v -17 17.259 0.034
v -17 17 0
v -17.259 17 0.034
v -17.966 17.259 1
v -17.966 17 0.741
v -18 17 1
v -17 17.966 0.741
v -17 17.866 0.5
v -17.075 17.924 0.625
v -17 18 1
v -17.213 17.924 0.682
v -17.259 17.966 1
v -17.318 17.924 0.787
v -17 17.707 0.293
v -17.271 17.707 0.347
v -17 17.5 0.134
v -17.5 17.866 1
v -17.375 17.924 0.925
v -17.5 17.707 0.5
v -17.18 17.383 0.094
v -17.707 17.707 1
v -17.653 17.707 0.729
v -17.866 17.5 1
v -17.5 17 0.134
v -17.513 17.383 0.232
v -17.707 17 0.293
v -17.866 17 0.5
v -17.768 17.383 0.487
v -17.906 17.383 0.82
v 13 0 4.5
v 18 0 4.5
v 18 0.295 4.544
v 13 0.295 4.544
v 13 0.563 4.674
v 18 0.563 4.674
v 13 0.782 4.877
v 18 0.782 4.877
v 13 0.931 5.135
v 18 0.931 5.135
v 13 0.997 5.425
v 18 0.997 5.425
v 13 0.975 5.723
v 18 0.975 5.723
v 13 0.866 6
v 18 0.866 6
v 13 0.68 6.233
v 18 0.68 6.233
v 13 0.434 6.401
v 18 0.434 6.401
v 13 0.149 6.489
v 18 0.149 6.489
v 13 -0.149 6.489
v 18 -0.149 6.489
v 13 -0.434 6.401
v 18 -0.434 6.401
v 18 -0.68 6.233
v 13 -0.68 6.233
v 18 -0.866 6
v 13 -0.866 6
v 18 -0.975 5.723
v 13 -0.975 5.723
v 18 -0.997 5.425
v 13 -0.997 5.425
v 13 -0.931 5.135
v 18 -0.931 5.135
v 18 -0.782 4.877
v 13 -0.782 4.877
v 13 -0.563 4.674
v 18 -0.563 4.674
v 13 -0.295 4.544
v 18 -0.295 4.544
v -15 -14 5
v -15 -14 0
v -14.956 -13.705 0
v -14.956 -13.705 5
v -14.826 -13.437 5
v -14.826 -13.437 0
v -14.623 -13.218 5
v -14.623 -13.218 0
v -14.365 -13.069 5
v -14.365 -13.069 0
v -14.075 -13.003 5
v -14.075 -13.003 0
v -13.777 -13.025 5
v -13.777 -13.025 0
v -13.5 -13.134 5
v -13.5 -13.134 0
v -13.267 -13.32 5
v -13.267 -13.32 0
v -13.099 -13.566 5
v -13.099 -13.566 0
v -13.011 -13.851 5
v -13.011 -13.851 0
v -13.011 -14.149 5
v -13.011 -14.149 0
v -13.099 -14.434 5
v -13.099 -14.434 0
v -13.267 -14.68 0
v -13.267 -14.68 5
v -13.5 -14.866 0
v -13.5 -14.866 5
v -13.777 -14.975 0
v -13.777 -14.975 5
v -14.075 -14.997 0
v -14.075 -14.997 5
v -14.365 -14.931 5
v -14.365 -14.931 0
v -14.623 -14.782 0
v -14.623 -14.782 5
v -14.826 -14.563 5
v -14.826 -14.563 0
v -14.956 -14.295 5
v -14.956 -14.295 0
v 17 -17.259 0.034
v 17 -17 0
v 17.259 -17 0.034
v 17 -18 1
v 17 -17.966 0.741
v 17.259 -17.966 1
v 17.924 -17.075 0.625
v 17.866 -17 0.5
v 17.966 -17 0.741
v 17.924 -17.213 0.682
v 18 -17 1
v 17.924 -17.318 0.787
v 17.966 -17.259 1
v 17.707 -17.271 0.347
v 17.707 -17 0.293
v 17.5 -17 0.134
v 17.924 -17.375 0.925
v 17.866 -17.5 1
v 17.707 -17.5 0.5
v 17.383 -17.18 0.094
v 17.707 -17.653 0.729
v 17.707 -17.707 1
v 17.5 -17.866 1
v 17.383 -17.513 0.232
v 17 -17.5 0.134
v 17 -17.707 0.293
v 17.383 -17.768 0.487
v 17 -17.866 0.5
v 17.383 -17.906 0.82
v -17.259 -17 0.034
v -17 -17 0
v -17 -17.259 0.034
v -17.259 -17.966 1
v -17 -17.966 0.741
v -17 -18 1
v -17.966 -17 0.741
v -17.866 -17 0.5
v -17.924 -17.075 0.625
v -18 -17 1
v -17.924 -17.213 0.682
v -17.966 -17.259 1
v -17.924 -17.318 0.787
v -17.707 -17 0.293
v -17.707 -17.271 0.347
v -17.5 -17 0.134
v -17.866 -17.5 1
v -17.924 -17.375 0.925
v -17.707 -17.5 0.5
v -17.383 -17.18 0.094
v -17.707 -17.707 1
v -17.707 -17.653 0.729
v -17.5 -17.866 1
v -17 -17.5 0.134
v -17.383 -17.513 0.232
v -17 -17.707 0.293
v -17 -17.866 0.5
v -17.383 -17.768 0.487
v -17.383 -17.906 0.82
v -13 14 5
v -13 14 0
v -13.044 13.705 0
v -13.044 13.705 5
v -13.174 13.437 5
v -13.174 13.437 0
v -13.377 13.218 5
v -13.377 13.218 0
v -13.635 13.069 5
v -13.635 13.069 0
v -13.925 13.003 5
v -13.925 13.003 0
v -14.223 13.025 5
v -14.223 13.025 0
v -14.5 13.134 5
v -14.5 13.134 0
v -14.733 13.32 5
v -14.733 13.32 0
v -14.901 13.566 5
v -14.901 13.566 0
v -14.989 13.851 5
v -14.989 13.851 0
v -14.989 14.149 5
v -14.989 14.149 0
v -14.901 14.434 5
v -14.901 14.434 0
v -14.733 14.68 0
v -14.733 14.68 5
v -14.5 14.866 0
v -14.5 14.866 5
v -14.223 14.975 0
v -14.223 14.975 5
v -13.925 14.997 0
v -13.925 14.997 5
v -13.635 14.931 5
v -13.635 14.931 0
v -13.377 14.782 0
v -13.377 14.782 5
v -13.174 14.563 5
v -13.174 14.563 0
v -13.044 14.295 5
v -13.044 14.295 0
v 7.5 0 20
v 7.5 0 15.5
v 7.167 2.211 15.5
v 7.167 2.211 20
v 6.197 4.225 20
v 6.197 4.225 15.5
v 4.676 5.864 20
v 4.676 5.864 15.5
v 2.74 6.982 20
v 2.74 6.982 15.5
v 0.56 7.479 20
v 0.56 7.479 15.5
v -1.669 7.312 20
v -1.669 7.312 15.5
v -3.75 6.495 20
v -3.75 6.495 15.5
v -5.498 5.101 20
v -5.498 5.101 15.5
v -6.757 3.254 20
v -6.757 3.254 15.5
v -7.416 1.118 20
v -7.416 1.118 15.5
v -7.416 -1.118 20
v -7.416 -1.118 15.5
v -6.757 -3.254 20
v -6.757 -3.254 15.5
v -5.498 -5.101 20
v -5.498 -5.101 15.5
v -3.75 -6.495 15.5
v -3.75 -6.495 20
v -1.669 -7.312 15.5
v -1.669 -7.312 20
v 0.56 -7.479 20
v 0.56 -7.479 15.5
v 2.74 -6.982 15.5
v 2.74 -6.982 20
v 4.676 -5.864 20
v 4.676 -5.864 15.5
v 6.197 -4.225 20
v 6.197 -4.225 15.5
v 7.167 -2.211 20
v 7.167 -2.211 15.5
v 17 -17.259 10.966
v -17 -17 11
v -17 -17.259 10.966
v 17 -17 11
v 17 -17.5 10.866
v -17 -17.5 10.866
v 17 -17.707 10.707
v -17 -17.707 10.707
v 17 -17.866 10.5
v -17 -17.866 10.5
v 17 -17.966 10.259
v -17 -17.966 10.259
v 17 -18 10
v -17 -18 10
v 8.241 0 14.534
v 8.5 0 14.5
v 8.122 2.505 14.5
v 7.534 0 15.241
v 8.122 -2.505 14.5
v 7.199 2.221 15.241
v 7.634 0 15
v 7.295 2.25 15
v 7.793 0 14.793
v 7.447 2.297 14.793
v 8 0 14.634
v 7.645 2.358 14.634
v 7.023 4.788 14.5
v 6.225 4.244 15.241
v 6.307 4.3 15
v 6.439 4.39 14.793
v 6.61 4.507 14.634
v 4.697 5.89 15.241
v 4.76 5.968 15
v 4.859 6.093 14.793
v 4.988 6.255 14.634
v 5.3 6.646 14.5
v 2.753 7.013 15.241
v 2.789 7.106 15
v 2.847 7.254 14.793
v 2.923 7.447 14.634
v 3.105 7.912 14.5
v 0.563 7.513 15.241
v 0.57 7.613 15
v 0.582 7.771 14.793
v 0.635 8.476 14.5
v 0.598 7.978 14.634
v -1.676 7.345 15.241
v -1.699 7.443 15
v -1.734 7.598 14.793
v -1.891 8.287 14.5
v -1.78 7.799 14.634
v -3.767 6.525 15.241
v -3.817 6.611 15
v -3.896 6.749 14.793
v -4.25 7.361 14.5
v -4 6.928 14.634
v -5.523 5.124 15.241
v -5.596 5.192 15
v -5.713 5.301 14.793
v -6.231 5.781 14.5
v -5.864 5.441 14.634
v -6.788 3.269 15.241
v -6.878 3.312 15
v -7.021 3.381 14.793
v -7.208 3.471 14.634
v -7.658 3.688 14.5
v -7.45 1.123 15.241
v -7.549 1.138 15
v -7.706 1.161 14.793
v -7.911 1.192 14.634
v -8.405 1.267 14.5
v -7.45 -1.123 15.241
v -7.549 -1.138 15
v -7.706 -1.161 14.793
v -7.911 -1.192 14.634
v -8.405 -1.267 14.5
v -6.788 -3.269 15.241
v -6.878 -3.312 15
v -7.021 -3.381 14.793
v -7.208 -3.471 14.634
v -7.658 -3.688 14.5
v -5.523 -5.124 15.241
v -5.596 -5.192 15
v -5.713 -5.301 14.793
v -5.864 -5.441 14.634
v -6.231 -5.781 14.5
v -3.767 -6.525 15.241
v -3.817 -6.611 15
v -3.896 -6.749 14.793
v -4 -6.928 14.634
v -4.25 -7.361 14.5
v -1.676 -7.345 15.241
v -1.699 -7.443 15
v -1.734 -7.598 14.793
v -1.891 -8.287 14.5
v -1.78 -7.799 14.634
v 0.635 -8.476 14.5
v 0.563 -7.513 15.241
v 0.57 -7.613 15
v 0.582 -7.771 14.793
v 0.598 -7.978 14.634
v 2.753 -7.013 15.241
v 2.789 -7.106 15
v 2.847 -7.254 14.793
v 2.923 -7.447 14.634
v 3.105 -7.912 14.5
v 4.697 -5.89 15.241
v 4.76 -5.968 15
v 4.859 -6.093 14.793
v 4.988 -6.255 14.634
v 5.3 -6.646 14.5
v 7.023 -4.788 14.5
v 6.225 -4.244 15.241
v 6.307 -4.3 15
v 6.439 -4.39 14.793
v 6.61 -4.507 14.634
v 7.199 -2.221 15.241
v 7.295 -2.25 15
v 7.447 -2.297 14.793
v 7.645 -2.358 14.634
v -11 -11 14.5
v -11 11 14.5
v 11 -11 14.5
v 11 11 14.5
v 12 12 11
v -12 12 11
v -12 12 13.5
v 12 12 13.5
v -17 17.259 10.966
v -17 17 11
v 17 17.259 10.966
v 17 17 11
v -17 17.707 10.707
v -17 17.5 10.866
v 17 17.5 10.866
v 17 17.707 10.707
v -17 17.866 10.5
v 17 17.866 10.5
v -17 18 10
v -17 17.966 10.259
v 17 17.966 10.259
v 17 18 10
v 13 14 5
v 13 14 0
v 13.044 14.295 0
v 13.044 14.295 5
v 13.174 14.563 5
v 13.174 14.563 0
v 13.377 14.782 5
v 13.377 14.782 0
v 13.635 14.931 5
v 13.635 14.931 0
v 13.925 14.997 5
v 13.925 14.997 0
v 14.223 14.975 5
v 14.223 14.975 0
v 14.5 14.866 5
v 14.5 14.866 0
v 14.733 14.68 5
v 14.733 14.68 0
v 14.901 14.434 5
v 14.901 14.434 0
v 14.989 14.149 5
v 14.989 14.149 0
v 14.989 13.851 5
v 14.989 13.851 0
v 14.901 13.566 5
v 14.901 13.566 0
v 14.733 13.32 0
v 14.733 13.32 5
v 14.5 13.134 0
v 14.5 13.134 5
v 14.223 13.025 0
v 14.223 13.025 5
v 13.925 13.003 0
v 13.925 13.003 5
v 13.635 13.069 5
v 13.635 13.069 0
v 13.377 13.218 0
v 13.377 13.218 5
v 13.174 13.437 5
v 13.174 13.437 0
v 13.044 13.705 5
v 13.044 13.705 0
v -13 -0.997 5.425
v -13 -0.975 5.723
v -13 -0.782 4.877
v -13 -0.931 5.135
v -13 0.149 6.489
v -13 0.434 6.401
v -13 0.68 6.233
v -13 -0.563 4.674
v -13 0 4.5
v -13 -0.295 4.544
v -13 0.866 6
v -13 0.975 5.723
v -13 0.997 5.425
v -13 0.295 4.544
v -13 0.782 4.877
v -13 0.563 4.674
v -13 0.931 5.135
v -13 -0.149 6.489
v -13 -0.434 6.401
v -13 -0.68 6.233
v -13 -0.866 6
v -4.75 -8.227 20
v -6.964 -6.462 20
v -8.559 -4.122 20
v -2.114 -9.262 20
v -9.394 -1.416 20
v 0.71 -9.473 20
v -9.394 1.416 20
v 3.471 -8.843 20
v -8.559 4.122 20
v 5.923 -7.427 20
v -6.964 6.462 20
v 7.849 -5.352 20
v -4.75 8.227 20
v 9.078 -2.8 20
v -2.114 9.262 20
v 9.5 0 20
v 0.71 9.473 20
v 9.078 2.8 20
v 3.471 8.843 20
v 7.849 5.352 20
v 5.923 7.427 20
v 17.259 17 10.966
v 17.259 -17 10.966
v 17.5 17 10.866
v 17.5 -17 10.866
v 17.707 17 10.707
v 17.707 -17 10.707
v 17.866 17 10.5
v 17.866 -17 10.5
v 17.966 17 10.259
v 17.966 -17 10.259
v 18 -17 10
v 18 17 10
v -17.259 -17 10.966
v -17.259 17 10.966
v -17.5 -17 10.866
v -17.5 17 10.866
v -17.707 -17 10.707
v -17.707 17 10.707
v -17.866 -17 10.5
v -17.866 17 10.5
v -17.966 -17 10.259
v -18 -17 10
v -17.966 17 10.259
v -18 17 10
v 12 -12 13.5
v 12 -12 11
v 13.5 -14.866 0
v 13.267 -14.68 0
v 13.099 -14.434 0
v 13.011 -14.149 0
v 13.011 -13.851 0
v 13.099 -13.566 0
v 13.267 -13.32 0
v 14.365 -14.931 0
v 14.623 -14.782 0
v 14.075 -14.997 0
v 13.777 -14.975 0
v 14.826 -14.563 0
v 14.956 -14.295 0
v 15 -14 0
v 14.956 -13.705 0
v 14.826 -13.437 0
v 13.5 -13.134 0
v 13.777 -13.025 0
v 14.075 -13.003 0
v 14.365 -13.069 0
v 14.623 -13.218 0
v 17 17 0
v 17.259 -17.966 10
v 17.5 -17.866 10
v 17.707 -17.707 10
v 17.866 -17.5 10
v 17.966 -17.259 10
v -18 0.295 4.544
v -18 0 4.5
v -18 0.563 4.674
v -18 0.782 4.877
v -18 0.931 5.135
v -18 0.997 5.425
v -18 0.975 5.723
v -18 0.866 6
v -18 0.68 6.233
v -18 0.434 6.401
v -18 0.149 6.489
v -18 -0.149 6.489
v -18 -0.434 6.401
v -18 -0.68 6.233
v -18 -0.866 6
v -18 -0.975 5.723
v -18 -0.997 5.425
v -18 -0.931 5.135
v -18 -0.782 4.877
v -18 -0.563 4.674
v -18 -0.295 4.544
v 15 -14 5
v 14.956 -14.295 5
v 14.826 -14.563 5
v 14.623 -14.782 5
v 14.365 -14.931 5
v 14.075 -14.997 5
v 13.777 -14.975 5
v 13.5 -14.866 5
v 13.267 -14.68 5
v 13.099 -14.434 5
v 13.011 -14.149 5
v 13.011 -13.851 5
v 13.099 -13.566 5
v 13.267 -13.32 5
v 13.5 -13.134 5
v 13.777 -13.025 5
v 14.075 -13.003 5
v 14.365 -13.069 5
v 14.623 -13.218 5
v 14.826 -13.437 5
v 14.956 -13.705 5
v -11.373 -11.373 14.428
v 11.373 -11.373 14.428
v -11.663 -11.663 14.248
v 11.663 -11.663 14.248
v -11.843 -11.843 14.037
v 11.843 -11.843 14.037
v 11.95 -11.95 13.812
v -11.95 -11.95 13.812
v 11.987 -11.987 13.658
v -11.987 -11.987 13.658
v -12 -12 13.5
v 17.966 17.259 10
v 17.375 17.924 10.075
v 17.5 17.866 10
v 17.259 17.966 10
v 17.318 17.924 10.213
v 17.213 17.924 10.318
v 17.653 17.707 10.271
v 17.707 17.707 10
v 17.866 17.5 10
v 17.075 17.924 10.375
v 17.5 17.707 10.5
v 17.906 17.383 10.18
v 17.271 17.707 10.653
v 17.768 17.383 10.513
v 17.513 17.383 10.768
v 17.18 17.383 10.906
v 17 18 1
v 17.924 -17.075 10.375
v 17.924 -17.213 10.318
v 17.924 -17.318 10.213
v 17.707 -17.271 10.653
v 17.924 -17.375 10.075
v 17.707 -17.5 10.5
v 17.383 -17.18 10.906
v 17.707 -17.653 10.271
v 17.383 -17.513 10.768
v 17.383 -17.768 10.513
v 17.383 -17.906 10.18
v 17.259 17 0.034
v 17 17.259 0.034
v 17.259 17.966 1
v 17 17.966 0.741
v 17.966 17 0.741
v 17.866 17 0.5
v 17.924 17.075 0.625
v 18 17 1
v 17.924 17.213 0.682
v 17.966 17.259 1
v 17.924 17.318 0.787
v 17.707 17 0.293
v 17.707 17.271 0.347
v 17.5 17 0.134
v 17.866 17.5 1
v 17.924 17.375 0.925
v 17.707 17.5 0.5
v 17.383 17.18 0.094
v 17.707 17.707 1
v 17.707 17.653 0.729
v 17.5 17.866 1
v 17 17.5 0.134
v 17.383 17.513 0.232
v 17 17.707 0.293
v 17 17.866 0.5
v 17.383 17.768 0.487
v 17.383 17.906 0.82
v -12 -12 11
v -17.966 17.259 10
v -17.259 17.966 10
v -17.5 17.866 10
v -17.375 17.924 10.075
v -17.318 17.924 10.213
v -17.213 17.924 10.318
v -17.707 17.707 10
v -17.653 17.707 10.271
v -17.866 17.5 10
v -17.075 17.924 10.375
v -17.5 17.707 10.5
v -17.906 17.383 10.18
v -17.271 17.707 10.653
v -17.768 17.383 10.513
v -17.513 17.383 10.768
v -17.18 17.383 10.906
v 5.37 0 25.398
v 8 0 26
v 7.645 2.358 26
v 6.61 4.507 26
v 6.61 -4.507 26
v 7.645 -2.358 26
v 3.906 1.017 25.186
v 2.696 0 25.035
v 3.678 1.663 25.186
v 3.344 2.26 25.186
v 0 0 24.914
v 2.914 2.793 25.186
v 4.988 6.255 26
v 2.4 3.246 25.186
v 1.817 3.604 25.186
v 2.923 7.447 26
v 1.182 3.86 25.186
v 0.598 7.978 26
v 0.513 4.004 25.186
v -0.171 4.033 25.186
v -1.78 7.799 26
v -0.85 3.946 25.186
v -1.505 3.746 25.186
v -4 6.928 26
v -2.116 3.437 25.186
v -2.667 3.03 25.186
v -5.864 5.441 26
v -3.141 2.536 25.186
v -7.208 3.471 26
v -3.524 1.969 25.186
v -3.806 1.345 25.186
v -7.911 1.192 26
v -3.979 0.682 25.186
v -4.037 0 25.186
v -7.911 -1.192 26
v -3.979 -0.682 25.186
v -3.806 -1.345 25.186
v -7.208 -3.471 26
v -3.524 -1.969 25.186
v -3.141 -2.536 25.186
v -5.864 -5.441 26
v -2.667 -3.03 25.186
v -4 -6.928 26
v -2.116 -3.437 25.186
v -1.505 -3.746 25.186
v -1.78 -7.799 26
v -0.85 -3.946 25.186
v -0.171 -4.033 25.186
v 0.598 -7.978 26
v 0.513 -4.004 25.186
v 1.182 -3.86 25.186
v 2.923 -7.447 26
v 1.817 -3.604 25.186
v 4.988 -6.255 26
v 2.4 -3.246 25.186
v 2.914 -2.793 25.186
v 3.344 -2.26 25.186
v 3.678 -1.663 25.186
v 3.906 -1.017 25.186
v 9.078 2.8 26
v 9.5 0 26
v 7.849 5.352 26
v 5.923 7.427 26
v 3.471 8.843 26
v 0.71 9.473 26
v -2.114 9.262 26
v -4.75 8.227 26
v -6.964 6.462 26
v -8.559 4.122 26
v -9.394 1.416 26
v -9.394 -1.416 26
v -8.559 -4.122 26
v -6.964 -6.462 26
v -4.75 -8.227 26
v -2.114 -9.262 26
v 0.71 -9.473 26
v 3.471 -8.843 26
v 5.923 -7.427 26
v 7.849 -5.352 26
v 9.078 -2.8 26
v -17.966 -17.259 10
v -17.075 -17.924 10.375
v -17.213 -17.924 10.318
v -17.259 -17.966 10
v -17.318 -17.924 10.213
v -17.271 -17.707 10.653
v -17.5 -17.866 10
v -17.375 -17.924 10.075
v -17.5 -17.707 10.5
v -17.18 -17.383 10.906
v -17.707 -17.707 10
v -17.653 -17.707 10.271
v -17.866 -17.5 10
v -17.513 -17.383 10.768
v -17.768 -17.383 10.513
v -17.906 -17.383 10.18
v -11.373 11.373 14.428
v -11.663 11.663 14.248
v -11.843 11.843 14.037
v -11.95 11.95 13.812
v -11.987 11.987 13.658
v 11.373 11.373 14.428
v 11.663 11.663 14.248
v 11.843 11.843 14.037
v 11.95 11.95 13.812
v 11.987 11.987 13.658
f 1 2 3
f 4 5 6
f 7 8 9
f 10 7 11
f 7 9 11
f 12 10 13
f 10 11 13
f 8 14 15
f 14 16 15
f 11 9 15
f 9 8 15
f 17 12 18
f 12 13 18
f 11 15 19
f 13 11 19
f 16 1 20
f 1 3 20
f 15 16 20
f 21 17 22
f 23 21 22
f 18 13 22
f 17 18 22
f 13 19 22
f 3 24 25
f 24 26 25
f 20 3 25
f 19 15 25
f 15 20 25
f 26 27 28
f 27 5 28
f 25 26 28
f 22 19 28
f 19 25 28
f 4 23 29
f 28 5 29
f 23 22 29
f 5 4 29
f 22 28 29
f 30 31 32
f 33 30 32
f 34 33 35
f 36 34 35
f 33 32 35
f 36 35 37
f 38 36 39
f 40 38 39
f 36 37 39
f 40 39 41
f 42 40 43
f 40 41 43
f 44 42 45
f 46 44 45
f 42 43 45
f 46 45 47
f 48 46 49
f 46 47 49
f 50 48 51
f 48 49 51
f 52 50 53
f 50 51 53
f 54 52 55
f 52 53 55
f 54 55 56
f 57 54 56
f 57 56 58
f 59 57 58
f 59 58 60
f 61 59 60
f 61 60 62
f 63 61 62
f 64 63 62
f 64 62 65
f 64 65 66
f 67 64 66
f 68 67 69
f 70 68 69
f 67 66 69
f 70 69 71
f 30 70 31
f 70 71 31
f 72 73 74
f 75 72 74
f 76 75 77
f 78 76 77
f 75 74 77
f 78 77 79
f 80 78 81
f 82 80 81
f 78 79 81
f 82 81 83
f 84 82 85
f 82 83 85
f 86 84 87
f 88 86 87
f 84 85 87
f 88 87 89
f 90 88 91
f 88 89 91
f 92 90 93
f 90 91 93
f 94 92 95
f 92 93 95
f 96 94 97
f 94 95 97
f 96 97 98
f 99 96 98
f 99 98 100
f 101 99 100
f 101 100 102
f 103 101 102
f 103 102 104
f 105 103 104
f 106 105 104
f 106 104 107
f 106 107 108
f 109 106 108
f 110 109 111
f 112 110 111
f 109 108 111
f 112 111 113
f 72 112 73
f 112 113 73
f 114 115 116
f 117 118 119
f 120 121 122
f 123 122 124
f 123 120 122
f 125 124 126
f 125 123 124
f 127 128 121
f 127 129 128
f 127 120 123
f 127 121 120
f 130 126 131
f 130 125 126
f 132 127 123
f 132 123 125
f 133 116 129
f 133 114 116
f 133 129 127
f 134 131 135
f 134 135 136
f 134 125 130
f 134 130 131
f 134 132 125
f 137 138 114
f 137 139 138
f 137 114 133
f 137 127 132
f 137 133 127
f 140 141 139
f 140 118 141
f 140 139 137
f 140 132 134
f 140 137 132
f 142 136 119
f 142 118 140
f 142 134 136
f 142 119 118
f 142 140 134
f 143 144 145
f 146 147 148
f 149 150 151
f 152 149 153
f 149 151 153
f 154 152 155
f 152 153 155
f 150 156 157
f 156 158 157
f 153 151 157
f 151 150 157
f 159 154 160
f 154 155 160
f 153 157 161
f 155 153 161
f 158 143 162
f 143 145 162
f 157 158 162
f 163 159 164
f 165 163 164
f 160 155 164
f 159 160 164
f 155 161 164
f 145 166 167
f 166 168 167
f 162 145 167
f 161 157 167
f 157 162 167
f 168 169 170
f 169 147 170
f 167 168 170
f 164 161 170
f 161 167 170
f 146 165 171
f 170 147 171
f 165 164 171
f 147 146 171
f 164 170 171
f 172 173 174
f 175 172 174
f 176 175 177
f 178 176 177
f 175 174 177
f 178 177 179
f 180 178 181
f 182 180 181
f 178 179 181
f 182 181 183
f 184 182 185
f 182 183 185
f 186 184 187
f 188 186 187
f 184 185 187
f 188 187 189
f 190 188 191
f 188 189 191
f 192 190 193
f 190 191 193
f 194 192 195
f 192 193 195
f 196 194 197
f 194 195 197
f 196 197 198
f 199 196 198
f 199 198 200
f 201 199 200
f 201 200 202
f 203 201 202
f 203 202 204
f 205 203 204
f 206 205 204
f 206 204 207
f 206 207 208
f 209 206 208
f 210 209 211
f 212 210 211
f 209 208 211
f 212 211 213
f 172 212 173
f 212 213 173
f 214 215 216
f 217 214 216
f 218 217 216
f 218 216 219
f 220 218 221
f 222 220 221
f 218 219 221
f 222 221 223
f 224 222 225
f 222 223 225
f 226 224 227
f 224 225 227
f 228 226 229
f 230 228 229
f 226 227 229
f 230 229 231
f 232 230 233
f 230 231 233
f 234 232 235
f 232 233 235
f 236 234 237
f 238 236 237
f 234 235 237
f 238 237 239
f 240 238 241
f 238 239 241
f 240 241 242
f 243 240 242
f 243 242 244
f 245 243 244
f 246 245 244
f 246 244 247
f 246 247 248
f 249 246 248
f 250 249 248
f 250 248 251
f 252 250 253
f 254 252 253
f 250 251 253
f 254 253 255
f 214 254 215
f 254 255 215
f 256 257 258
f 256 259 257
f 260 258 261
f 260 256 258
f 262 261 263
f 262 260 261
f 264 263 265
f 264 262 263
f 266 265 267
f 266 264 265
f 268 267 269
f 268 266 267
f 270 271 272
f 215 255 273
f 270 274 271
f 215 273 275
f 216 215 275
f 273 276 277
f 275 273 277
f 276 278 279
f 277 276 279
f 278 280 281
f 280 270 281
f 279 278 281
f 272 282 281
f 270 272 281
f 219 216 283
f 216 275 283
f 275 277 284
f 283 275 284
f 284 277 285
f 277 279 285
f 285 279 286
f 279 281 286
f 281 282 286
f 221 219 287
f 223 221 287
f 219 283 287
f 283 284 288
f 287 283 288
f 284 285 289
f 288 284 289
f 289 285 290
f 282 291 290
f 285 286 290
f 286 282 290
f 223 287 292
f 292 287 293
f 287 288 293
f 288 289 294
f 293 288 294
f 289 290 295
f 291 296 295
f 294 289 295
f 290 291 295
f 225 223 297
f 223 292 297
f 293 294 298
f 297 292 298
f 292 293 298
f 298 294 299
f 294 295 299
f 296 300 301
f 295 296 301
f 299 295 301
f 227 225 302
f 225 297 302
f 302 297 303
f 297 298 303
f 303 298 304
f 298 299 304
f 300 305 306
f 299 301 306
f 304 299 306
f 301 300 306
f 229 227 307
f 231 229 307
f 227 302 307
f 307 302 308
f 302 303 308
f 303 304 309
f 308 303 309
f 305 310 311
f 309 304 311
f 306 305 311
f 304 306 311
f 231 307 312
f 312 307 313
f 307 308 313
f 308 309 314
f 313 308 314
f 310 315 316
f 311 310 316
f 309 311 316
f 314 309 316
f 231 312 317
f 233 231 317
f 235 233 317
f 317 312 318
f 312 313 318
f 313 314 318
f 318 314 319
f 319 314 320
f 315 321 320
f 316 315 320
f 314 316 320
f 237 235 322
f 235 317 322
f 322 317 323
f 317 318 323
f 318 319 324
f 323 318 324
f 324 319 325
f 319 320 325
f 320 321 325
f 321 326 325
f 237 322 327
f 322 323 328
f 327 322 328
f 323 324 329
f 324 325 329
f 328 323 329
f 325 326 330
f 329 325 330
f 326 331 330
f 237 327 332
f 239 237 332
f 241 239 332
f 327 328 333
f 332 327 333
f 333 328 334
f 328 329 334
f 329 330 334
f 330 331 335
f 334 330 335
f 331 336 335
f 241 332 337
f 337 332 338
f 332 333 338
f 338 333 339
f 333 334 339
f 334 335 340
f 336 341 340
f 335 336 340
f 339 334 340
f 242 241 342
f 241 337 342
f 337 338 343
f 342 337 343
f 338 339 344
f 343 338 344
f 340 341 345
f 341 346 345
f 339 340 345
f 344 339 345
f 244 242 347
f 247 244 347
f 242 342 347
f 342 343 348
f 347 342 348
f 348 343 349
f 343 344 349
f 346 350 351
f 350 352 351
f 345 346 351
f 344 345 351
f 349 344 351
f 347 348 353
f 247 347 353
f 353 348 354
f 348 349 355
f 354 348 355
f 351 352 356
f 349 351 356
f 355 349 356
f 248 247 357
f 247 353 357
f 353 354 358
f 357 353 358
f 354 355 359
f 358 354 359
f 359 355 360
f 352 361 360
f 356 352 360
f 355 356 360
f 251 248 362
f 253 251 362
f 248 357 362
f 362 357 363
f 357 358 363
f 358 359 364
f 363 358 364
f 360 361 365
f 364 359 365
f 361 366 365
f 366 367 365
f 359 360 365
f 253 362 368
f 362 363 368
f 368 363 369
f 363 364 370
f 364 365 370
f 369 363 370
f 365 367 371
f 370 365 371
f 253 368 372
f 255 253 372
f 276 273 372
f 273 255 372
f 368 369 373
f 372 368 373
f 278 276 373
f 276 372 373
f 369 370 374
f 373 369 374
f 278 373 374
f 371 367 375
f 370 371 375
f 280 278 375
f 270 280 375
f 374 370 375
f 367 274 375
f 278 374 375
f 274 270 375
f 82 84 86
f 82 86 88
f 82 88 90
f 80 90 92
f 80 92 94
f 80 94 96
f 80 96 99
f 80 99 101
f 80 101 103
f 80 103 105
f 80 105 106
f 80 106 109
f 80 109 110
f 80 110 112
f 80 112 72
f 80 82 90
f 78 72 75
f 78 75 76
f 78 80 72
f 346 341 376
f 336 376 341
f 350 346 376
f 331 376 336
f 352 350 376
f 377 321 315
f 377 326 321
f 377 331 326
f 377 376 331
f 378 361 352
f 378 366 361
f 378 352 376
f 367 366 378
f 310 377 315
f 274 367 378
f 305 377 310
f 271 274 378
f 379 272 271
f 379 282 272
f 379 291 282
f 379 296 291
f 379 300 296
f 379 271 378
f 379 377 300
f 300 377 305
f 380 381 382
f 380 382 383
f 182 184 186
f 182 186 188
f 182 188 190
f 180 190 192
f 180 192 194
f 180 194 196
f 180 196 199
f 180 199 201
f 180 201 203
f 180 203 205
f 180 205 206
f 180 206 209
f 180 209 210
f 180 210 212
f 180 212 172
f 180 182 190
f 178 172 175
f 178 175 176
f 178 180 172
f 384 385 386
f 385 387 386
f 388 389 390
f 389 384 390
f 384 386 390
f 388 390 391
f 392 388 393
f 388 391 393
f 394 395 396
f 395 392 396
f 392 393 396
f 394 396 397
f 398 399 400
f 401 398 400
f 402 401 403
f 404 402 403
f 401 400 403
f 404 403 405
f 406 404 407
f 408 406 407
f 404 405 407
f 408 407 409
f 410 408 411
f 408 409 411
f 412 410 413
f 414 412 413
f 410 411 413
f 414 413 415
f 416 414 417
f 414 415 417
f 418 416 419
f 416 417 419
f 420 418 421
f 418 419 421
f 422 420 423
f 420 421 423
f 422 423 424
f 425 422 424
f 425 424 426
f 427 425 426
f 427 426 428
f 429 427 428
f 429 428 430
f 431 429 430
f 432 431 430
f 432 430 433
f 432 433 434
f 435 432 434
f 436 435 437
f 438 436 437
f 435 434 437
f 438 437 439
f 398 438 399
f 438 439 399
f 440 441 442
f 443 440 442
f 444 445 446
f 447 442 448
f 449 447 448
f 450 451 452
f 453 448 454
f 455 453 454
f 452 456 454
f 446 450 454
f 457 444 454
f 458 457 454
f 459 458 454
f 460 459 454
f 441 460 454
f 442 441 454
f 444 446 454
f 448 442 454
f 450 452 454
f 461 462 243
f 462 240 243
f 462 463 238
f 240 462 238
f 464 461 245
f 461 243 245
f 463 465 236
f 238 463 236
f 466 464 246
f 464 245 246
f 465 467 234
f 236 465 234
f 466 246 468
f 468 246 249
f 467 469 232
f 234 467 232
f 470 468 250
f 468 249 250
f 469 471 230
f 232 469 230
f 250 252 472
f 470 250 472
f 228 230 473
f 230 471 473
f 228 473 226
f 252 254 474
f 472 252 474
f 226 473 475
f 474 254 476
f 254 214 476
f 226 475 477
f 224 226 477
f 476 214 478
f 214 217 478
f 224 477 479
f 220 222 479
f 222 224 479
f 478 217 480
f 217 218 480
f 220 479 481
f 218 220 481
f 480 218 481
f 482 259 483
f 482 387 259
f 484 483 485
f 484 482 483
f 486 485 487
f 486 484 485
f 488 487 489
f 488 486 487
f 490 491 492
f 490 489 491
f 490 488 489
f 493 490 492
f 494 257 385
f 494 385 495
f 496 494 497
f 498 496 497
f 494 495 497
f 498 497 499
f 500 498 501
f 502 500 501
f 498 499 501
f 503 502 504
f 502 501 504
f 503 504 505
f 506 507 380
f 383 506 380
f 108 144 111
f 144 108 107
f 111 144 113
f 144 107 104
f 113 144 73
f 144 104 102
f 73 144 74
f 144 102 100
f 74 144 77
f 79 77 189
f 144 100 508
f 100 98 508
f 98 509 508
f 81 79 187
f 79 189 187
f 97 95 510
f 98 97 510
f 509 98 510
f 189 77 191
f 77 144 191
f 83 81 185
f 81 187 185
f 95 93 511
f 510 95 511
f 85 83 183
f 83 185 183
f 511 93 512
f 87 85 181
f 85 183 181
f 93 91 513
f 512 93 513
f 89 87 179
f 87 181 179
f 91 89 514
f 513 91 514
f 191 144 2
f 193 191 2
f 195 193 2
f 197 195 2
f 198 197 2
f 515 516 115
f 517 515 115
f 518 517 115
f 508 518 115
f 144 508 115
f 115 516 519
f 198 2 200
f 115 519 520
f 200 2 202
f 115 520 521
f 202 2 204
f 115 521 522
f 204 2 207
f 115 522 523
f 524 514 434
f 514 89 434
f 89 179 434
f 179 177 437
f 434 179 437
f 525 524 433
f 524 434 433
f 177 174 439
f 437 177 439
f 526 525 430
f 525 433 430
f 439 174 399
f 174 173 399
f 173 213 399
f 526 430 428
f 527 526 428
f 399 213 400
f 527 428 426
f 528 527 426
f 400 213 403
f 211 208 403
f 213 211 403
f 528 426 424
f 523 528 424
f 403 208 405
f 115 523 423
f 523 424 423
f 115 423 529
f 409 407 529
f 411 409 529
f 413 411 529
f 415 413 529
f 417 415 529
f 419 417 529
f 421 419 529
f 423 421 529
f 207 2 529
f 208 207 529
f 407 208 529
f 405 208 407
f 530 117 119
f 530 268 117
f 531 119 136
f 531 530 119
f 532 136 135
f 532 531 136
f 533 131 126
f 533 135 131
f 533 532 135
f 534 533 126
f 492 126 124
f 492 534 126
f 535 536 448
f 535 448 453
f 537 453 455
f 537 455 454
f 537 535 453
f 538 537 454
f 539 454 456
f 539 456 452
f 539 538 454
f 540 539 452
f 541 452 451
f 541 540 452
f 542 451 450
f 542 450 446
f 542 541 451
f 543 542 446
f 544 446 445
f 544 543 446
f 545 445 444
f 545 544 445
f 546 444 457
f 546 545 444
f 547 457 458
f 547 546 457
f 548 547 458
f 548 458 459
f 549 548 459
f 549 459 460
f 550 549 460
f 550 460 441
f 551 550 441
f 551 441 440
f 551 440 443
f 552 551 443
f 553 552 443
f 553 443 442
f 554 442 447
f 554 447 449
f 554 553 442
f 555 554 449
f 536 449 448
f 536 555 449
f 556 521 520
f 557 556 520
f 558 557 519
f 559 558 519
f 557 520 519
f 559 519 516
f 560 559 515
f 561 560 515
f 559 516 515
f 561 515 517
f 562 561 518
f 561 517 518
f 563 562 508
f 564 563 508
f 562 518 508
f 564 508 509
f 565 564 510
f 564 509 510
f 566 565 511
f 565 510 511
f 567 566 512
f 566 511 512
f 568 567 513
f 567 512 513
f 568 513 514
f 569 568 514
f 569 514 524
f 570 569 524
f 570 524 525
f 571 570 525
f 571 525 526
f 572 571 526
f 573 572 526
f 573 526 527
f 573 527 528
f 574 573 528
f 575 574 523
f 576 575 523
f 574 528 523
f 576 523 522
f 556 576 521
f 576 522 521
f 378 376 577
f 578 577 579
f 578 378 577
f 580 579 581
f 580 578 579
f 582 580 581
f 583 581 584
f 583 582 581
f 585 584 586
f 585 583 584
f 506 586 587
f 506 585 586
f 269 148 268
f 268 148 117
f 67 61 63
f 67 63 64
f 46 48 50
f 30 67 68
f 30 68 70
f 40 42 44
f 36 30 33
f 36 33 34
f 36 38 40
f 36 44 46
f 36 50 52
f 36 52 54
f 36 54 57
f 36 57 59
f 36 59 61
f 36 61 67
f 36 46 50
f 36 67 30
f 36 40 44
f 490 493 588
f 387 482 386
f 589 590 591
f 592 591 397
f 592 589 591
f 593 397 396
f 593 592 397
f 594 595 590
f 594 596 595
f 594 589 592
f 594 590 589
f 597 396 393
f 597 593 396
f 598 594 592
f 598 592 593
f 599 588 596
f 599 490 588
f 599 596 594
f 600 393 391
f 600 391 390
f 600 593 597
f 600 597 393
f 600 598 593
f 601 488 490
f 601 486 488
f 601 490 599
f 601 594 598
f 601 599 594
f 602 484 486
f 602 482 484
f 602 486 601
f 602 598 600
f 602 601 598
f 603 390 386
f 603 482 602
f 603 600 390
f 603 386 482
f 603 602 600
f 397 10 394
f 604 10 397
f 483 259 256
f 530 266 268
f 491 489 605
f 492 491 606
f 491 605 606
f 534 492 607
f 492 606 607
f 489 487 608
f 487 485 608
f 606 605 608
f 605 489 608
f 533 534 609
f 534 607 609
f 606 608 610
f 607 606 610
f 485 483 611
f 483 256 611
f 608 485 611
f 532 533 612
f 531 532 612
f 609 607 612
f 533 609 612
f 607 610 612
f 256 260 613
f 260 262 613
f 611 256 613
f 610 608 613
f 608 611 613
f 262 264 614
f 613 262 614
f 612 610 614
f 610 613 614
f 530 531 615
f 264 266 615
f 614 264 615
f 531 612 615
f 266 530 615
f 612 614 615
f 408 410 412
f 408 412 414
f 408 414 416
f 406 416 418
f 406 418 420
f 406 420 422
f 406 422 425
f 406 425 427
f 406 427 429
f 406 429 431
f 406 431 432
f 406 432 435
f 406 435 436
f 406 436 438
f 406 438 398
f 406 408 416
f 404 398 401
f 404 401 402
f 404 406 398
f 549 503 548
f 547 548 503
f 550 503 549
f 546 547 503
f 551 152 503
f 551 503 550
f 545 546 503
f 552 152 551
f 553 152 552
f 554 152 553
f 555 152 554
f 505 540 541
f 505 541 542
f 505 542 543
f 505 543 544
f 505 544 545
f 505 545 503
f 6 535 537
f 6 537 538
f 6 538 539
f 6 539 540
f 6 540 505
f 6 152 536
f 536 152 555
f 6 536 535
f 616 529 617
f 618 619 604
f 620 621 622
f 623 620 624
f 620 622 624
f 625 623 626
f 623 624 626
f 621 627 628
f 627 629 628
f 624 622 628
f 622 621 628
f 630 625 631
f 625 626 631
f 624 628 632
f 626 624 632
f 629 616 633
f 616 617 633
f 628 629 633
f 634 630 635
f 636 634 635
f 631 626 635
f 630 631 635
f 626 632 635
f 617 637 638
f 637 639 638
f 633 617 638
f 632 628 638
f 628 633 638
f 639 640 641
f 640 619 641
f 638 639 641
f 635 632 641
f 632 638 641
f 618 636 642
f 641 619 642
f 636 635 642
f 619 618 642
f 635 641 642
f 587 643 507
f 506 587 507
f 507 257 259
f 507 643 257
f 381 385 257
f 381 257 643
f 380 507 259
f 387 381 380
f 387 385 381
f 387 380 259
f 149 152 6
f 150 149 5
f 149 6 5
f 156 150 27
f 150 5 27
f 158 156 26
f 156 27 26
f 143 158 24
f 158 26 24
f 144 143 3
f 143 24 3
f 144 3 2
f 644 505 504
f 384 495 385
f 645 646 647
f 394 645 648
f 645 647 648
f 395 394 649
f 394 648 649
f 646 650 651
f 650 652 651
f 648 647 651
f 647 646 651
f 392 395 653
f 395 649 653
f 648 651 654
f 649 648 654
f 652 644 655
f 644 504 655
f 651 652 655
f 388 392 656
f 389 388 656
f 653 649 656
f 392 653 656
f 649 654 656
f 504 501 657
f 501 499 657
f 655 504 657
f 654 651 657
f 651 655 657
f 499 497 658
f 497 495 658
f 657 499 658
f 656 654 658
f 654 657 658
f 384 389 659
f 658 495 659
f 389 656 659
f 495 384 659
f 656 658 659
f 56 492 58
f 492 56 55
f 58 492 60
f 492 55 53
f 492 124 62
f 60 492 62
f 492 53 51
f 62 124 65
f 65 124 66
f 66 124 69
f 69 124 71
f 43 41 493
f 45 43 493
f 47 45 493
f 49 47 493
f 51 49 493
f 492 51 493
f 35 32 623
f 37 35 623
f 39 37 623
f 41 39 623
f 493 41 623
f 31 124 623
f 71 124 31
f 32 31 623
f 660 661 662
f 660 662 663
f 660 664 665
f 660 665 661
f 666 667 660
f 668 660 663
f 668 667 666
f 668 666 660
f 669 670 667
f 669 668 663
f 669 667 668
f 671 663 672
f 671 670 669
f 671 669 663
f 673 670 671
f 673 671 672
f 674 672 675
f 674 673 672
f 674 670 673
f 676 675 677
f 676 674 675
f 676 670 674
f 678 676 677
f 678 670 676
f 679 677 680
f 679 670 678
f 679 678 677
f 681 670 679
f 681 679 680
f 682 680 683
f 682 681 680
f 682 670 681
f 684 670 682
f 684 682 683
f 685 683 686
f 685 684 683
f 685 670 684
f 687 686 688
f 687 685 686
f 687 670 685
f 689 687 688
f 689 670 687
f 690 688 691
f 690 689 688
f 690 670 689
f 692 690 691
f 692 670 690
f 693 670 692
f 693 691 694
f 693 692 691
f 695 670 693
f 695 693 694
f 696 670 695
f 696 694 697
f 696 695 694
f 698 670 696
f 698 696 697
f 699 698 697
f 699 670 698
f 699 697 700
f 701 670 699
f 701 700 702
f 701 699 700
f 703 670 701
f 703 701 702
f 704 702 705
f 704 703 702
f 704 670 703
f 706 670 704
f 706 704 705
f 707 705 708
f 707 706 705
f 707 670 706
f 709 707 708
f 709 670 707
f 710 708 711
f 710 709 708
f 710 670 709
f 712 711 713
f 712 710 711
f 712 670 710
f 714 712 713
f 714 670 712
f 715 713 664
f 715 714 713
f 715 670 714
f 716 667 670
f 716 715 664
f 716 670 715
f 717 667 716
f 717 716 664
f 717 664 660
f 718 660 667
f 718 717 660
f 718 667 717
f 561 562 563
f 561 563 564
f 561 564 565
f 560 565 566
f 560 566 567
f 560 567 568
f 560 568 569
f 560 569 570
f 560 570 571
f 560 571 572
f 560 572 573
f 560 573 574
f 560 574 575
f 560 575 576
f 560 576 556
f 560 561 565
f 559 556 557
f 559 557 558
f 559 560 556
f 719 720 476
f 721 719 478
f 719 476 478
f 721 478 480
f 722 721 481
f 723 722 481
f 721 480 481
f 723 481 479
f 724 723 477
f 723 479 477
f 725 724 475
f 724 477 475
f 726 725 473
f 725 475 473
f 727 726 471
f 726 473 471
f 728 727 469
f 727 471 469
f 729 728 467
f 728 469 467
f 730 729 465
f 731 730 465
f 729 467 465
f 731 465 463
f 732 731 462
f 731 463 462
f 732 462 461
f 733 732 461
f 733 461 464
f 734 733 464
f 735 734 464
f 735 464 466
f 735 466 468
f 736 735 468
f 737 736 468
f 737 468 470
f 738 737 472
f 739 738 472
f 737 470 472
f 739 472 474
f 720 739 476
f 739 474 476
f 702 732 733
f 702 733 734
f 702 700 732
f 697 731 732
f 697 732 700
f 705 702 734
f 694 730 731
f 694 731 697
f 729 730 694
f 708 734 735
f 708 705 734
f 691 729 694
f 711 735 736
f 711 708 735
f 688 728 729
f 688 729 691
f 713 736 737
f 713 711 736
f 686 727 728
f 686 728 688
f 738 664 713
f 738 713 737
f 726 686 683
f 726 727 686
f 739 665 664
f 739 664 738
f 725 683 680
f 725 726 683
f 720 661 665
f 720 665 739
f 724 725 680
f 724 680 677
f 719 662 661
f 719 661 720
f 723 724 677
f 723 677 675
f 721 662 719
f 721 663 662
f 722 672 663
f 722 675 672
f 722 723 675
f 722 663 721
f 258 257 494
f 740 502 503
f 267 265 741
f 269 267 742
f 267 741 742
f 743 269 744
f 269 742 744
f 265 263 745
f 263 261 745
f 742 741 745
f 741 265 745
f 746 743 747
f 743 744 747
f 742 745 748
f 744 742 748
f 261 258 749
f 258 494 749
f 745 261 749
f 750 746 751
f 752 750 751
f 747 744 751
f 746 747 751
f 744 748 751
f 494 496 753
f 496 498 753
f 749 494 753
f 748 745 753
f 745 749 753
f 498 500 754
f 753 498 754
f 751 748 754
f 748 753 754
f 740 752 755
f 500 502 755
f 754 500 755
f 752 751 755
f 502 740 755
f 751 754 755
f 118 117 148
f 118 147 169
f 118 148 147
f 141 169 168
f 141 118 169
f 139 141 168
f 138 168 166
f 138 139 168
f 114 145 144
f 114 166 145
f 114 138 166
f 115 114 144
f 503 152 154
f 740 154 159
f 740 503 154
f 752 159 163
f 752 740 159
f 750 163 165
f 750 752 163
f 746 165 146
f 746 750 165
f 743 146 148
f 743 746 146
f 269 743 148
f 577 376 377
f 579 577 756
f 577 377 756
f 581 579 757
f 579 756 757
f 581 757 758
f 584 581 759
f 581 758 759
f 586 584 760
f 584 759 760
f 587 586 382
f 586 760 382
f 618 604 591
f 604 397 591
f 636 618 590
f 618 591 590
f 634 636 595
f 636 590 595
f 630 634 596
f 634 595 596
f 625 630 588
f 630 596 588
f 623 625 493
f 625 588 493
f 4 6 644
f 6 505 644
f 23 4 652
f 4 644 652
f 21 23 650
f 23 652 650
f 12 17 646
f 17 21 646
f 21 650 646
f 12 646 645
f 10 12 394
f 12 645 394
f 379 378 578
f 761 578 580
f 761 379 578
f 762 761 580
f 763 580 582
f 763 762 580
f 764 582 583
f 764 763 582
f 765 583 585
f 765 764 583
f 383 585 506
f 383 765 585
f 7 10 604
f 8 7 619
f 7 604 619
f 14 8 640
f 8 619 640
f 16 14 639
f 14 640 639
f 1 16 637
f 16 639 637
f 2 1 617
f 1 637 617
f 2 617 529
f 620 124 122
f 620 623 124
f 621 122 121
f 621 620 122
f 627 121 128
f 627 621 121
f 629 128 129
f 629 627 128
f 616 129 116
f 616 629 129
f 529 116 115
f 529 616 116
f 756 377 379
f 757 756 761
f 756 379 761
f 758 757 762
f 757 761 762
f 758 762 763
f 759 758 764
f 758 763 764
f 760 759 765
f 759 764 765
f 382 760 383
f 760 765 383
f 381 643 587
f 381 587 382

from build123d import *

# Parameters (mm, degrees)
SKETCH_1_W          = 36
SKETCH_1_H          = 36
EXTRUDE_1_DEPTH     = 11
SKETCH_2_W          = 24
SKETCH_2_H          = 24
EXTRUDE_2_DEPTH     = 3.5
SKETCH_3_R          = 7.5
EXTRUDE_3_DEPTH     = 5.5
SKETCH_4_R          = 9.5
EXTRUDE_4_DEPTH     = 6
FILLET_1_R          = 1
SKETCH_6_R          = 1
CUT_EXTRUDE_1_DEPTH = 5
SKETCH_7_R          = 1
CUT_EXTRUDE_2_DEPTH = 5


with BuildPart() as part:
    # 草图1 → 凸台-拉伸1 (new body)
    with BuildSketch(Plane.XY):
        Rectangle(SKETCH_1_W, SKETCH_1_H)
    extrude(amount=EXTRUDE_1_DEPTH)

    # 草图2 → 凸台-拉伸2 (add)
    with BuildSketch(Plane.XY.offset(11)):
        Rectangle(SKETCH_2_W, SKETCH_2_H)
    extrude(amount=EXTRUDE_2_DEPTH)

    # 草图3 → 凸台-拉伸3 (add)
    with BuildSketch(Plane.XY.offset(14.5)):
        Circle(SKETCH_3_R)
    extrude(amount=EXTRUDE_3_DEPTH)

    # 草图4 → 凸台-拉伸4 (add)
    with BuildSketch(Plane.XY.offset(20)):
        Circle(SKETCH_4_R)
    extrude(amount=EXTRUDE_4_DEPTH)

    # 草图5 → 切除-旋转1 (revolve, cut)
    with BuildSketch(Plane(origin=(0, 0, 0), x_dir=(1, 0, 0), z_dir=(0, 1, 0))):
        with BuildLine():
            Line((0, -24.91366459), (0, -26))
            Line((0, -26), (8, -26))
            ThreePointArc((8, -26), (4.036710437, -25.186488995), (0, -24.91366459))
        make_face()
    revolve(axis=Axis((0, 0, 24.353707744), (0, 0, 1)), mode=Mode.SUBTRACT)

    # 圆角1
    fillet_1_edges = [part.edges().sort_by_distance(p)[0] for p in [
        (-18, 0, 11),
        (0, -18, 11),
        (-12, 0, 14.5),
        (0, -12, 14.5),
        (12, 0, 14.5),
        (0, 12, 14.5),
        (-7.5, 0, 14.5),
        (18, 0, 11),
        (0, -18, 0),
        (-18, 0, 0),
        (0, 18, 0),
        (18, 0, 0),
        (18, -18, 5.5),
        (-18, -18, 5.5),
        (-18, 18, 5.5),
        (18, 18, 5.5),
        (0, 18, 11),
    ]]
    fillet(fillet_1_edges, radius=FILLET_1_R)

    # 草图6 → 切除-拉伸1 (cut)
    with BuildSketch(Plane(origin=(18, 0, 0), x_dir=(0, 0, -1), z_dir=(1, 0, 0))):
        with Locations((-5.5, 0)):
            Circle(SKETCH_6_R)
    cut_extrude_1 = extrude(amount=-CUT_EXTRUDE_1_DEPTH, mode=Mode.SUBTRACT)

    # 镜向1: 切除-拉伸1 across plane
    add(cut_extrude_1.mirror(Plane(origin=(0, 0, 0), x_dir=(0, 0, 1), z_dir=(1, 0, 0))), mode=Mode.SUBTRACT)

    # 草图7 → 切除-拉伸2 (cut)
    with BuildSketch(Plane(origin=(0, 0, 0), x_dir=(-1, 0, 0), z_dir=(0, 0, -1))):
        with Locations((-14, 14)):
            Circle(SKETCH_7_R)
        with Locations(Location((-14, -14, 0), (0, 0, 180))):
            Circle(SKETCH_7_R)
        with Locations((14, -14)):
            Circle(SKETCH_7_R)
        with Locations(Location((14, 14, 0), (0, 0, 180))):
            Circle(SKETCH_7_R)
    extrude(amount=-CUT_EXTRUDE_2_DEPTH, mode=Mode.SUBTRACT)


solid = part.part
